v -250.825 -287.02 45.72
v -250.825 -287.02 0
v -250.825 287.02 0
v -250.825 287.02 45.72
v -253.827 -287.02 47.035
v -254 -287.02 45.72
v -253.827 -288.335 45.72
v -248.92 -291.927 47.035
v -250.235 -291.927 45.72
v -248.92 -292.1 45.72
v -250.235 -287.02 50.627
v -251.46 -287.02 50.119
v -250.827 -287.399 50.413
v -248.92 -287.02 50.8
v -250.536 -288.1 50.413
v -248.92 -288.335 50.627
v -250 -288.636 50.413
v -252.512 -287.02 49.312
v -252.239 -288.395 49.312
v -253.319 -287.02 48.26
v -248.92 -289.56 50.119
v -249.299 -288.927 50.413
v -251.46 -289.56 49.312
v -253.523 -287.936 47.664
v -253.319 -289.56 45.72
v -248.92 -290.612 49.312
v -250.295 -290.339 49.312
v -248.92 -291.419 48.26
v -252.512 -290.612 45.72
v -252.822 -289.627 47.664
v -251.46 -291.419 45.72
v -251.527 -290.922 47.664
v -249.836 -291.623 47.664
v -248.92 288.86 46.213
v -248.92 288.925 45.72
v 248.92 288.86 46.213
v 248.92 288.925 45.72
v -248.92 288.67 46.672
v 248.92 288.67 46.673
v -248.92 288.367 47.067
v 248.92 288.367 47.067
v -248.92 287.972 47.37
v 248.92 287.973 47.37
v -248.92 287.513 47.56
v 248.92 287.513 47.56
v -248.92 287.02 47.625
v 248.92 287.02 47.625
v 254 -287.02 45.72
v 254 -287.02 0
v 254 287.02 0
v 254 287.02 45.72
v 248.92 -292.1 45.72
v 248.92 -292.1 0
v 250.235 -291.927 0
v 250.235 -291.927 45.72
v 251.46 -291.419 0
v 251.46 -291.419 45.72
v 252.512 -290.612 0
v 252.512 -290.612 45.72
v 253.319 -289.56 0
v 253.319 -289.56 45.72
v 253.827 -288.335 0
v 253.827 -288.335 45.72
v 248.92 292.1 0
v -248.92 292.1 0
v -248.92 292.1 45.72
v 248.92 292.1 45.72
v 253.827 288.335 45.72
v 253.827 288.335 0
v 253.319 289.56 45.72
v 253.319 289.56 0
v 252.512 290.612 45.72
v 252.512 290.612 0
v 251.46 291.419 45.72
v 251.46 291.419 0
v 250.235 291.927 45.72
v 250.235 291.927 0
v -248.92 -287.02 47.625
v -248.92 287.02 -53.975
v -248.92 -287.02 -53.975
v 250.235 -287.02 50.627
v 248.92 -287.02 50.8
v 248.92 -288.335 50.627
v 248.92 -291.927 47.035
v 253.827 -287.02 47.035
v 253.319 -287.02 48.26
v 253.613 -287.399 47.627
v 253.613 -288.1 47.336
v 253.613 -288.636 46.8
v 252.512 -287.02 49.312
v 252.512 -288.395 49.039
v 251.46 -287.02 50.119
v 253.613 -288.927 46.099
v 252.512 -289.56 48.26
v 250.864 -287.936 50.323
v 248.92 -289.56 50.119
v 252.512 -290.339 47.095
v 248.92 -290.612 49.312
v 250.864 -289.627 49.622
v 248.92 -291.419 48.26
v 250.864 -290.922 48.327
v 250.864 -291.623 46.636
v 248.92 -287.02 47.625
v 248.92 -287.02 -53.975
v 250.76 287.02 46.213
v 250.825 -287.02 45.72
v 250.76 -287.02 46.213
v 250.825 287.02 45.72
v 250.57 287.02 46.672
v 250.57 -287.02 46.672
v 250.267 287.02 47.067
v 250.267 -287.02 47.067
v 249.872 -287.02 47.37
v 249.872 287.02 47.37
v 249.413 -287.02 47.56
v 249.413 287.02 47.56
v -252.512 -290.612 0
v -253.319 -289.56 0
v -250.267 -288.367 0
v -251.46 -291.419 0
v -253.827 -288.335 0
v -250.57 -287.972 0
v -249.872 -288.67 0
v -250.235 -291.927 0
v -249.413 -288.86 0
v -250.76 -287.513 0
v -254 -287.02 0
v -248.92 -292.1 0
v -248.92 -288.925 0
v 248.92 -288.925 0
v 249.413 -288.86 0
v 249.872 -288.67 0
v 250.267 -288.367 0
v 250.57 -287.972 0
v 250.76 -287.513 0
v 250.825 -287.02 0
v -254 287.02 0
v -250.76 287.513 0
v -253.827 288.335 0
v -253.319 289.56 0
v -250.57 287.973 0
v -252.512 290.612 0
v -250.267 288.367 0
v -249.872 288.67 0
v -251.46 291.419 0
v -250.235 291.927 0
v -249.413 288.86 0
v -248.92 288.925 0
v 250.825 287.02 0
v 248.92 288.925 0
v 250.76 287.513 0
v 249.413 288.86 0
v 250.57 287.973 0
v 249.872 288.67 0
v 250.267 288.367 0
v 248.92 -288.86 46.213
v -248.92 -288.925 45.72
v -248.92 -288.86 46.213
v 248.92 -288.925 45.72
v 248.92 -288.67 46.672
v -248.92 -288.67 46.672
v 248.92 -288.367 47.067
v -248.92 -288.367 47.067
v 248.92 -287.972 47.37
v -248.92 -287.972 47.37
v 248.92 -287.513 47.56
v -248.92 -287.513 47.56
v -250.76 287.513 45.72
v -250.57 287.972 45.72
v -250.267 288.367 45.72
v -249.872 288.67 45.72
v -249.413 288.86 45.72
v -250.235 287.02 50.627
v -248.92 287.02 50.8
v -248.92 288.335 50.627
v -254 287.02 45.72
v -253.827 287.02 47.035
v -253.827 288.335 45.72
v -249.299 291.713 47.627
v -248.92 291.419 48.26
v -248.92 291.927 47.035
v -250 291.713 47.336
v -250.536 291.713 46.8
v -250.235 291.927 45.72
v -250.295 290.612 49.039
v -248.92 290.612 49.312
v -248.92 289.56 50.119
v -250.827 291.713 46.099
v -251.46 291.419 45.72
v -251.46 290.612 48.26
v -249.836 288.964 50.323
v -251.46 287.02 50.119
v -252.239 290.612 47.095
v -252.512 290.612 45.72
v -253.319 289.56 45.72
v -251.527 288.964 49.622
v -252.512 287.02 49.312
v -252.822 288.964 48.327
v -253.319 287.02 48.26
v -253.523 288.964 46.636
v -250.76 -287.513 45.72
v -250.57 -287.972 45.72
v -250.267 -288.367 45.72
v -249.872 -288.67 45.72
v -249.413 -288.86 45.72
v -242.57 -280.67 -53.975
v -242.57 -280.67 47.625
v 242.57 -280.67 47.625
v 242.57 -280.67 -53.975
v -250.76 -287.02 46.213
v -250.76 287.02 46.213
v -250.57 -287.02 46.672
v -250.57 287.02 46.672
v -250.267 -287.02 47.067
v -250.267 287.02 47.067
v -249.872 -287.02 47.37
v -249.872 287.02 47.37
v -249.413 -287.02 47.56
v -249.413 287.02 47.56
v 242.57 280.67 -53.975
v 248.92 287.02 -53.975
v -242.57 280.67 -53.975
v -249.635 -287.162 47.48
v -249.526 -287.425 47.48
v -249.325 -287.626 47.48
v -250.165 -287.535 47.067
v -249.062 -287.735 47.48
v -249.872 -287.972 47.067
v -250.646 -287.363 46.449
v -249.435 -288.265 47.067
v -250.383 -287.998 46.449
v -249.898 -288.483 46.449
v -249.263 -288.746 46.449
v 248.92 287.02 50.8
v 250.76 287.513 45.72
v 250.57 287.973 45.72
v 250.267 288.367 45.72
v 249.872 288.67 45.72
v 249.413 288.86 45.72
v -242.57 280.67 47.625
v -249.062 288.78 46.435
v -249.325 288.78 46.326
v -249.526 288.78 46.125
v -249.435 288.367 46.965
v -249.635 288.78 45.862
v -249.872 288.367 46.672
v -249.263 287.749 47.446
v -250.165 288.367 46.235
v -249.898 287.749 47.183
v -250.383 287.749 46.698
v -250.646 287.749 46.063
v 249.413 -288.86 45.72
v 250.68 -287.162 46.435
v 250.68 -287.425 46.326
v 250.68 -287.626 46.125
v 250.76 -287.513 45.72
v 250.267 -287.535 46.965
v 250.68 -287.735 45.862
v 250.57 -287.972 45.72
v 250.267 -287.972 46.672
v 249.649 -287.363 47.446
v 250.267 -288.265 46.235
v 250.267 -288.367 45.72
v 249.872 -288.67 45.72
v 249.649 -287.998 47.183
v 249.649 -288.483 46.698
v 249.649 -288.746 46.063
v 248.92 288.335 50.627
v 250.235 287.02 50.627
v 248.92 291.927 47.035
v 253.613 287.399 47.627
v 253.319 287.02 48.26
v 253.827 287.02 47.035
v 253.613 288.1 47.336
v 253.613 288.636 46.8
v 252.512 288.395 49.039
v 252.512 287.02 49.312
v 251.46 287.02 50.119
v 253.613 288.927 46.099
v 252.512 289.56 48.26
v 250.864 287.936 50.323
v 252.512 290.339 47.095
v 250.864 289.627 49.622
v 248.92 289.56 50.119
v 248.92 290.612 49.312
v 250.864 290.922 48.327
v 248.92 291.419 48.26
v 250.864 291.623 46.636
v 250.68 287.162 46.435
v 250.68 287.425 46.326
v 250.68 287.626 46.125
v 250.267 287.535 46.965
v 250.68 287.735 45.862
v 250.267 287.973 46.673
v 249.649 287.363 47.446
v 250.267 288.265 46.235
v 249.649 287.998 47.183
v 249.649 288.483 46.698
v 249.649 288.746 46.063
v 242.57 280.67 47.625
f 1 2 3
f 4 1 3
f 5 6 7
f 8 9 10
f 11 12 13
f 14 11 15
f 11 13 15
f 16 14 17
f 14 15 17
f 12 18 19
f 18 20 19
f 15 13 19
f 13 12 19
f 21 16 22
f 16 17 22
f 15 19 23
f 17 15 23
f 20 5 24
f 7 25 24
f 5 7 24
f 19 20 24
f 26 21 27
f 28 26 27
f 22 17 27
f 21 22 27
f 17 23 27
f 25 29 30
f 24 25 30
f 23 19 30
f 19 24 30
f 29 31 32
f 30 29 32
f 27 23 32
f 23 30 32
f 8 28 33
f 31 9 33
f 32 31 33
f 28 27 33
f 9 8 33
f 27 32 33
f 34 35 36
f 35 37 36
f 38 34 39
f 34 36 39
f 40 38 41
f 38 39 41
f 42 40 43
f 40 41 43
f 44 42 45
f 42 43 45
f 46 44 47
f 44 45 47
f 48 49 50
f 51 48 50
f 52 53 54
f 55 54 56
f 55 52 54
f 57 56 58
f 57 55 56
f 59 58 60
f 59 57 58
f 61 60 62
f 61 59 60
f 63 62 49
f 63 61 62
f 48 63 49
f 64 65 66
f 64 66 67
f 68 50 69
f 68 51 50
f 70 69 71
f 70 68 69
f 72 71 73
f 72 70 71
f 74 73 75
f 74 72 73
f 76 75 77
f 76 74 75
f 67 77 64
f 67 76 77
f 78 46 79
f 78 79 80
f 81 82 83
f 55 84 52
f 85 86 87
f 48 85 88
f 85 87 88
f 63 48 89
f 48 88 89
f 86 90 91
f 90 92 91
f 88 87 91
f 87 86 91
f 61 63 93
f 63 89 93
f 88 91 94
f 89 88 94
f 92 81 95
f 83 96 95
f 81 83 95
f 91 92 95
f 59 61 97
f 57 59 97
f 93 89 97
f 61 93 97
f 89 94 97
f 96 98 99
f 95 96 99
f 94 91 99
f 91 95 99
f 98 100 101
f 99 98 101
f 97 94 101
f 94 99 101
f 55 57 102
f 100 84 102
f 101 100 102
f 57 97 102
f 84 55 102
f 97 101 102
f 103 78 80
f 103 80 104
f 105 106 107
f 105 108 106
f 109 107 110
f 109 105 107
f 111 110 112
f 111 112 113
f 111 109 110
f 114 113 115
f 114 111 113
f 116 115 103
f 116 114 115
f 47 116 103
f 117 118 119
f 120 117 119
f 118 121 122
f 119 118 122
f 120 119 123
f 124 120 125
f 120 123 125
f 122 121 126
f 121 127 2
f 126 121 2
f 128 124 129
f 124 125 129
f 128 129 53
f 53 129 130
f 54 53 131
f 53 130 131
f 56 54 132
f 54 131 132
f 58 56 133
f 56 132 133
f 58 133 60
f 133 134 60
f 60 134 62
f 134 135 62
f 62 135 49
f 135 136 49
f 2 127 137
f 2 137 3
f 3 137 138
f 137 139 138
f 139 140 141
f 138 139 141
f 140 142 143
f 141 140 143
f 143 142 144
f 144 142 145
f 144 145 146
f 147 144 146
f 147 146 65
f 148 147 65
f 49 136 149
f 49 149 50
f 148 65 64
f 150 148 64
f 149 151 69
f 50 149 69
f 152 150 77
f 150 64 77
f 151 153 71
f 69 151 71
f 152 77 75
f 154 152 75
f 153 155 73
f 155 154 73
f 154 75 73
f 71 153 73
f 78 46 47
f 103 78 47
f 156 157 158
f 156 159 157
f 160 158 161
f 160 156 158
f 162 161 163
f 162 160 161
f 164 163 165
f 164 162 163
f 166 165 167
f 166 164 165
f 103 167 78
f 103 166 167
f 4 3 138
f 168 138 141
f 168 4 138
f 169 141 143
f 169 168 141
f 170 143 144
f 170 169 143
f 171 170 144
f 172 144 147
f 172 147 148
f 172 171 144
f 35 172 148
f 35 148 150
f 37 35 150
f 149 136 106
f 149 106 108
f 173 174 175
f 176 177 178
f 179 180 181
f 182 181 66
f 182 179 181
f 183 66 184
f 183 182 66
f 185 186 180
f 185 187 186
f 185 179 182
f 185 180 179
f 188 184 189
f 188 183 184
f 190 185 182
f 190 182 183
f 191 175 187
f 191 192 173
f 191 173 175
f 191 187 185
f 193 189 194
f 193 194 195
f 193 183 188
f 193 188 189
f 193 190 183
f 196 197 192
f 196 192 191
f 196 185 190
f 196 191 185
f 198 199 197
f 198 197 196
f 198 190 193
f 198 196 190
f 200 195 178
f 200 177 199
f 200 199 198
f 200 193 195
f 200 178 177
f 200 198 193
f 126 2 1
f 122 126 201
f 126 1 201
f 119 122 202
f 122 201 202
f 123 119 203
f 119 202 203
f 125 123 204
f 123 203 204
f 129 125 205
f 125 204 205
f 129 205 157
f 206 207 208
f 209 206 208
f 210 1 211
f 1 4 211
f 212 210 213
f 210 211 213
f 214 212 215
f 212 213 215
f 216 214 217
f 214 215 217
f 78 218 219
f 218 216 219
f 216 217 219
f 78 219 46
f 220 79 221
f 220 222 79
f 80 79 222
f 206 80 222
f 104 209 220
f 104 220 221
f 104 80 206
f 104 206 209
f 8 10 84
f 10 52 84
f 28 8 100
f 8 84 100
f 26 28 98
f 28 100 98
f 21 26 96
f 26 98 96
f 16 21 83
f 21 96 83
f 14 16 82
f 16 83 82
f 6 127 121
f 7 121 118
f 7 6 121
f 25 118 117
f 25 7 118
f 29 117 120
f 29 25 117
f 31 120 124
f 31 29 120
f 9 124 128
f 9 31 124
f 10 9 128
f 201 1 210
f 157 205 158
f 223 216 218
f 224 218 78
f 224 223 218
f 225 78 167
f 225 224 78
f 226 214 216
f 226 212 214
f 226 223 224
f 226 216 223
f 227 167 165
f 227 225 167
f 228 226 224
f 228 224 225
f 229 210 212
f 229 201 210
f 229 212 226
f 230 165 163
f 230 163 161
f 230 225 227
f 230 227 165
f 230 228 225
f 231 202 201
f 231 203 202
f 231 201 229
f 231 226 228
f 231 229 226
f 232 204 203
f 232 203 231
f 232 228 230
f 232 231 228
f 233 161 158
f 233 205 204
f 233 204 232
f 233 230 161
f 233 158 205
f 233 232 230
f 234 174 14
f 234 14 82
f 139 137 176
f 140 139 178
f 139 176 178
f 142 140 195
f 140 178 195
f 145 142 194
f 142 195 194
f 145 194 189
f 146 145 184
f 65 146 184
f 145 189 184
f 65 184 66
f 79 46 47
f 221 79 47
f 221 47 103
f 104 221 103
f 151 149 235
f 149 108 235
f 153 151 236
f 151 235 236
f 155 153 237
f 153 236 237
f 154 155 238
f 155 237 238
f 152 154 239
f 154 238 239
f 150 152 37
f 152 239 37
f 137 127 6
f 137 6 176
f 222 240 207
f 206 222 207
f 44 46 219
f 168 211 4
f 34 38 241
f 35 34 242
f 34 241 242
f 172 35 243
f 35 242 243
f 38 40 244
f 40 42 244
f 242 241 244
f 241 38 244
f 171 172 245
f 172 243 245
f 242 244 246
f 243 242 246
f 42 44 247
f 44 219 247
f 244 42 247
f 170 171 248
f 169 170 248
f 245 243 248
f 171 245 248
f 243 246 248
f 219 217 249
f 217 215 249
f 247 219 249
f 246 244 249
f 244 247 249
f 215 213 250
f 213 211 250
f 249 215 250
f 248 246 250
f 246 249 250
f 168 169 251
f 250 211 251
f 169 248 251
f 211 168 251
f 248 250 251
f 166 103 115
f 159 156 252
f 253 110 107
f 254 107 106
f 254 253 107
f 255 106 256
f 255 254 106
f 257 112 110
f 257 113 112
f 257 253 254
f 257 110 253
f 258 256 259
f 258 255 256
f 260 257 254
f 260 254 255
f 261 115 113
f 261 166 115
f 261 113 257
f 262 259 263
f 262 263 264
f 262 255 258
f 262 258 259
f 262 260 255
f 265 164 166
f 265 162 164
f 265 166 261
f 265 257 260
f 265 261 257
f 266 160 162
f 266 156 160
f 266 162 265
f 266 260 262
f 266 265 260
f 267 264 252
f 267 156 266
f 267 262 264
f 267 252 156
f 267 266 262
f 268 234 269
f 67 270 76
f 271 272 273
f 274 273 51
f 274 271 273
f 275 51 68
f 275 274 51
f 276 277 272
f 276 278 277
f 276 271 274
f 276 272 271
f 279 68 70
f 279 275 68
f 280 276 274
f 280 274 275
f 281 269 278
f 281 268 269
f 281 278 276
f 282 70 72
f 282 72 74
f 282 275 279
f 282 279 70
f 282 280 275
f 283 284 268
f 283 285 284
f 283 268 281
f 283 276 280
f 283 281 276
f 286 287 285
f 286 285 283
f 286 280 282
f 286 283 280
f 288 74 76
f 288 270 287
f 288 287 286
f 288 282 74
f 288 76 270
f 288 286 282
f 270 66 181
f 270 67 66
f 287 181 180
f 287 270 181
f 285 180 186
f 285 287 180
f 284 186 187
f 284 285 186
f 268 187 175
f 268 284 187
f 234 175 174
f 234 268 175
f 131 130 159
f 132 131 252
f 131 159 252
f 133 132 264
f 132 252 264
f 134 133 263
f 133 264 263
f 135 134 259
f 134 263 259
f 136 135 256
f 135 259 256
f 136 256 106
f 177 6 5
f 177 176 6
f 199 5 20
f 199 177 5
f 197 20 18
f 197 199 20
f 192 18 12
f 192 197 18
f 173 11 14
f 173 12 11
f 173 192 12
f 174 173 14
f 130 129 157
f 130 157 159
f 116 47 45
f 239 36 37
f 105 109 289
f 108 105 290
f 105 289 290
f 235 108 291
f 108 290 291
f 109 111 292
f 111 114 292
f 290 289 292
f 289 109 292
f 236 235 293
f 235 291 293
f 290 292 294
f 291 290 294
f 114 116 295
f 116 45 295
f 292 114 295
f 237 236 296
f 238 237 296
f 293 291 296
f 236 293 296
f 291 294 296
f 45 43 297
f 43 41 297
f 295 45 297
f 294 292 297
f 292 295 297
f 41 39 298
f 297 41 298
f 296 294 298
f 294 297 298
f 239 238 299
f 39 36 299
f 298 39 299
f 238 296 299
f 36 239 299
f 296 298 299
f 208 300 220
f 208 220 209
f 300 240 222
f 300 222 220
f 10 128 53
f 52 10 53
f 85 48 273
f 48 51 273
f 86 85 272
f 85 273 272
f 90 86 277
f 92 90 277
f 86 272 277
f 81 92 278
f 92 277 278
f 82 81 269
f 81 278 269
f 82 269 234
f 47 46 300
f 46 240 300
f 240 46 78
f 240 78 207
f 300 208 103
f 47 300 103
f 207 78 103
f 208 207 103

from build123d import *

# Parameters (mm, degrees)
F0_W     = 508
F0_H     = 584.2
F1_DEPTH = 50.8
F2_R     = 5.08
F3_T     = -3.175
F4_W     = 497.84
F4_H     = 574.04
F4_W_2   = 485.14
F4_H_2   = 561.34
F5_DEPTH = 101.6


with BuildPart() as f1:
    # F0 (on Top) → F1 (new body)
    with BuildSketch(Plane.XY):
        Rectangle(F0_W, F0_H)
    extrude(amount=F1_DEPTH)

    # F2
    f2_edges = [f1.edges().sort_by_distance(p)[0] for p in [
        (-254, -292.1, 25.4),
        (-254, 0, 50.8),
        (0, 292.1, 50.8),
        (0, -292.1, 50.8),
        (254, 0, 50.8),
        (254, -292.1, 25.4),
        (254, 292.1, 25.4),
        (-254, 292.1, 25.4),
    ]]
    fillet(f2_edges, radius=F2_R)

    # F3
    f3_openings = [f1.faces().sort_by_distance(p)[0] for p in [
        (0, 0, 0),
    ]]
    offset(amount=F3_T, openings=f3_openings)


with BuildPart() as f5:
    # F4 (on face) → F5 (new body)
    with BuildSketch(Plane(origin=(0, 0, 47.625), x_dir=(1, 0, 0), z_dir=(0, 0, -1))):
        Rectangle(F4_W, F4_H)
        Rectangle(F4_W_2, F4_H_2, mode=Mode.SUBTRACT)
    extrude(amount=F5_DEPTH)


solid = Compound([f1.part, f5.part])
